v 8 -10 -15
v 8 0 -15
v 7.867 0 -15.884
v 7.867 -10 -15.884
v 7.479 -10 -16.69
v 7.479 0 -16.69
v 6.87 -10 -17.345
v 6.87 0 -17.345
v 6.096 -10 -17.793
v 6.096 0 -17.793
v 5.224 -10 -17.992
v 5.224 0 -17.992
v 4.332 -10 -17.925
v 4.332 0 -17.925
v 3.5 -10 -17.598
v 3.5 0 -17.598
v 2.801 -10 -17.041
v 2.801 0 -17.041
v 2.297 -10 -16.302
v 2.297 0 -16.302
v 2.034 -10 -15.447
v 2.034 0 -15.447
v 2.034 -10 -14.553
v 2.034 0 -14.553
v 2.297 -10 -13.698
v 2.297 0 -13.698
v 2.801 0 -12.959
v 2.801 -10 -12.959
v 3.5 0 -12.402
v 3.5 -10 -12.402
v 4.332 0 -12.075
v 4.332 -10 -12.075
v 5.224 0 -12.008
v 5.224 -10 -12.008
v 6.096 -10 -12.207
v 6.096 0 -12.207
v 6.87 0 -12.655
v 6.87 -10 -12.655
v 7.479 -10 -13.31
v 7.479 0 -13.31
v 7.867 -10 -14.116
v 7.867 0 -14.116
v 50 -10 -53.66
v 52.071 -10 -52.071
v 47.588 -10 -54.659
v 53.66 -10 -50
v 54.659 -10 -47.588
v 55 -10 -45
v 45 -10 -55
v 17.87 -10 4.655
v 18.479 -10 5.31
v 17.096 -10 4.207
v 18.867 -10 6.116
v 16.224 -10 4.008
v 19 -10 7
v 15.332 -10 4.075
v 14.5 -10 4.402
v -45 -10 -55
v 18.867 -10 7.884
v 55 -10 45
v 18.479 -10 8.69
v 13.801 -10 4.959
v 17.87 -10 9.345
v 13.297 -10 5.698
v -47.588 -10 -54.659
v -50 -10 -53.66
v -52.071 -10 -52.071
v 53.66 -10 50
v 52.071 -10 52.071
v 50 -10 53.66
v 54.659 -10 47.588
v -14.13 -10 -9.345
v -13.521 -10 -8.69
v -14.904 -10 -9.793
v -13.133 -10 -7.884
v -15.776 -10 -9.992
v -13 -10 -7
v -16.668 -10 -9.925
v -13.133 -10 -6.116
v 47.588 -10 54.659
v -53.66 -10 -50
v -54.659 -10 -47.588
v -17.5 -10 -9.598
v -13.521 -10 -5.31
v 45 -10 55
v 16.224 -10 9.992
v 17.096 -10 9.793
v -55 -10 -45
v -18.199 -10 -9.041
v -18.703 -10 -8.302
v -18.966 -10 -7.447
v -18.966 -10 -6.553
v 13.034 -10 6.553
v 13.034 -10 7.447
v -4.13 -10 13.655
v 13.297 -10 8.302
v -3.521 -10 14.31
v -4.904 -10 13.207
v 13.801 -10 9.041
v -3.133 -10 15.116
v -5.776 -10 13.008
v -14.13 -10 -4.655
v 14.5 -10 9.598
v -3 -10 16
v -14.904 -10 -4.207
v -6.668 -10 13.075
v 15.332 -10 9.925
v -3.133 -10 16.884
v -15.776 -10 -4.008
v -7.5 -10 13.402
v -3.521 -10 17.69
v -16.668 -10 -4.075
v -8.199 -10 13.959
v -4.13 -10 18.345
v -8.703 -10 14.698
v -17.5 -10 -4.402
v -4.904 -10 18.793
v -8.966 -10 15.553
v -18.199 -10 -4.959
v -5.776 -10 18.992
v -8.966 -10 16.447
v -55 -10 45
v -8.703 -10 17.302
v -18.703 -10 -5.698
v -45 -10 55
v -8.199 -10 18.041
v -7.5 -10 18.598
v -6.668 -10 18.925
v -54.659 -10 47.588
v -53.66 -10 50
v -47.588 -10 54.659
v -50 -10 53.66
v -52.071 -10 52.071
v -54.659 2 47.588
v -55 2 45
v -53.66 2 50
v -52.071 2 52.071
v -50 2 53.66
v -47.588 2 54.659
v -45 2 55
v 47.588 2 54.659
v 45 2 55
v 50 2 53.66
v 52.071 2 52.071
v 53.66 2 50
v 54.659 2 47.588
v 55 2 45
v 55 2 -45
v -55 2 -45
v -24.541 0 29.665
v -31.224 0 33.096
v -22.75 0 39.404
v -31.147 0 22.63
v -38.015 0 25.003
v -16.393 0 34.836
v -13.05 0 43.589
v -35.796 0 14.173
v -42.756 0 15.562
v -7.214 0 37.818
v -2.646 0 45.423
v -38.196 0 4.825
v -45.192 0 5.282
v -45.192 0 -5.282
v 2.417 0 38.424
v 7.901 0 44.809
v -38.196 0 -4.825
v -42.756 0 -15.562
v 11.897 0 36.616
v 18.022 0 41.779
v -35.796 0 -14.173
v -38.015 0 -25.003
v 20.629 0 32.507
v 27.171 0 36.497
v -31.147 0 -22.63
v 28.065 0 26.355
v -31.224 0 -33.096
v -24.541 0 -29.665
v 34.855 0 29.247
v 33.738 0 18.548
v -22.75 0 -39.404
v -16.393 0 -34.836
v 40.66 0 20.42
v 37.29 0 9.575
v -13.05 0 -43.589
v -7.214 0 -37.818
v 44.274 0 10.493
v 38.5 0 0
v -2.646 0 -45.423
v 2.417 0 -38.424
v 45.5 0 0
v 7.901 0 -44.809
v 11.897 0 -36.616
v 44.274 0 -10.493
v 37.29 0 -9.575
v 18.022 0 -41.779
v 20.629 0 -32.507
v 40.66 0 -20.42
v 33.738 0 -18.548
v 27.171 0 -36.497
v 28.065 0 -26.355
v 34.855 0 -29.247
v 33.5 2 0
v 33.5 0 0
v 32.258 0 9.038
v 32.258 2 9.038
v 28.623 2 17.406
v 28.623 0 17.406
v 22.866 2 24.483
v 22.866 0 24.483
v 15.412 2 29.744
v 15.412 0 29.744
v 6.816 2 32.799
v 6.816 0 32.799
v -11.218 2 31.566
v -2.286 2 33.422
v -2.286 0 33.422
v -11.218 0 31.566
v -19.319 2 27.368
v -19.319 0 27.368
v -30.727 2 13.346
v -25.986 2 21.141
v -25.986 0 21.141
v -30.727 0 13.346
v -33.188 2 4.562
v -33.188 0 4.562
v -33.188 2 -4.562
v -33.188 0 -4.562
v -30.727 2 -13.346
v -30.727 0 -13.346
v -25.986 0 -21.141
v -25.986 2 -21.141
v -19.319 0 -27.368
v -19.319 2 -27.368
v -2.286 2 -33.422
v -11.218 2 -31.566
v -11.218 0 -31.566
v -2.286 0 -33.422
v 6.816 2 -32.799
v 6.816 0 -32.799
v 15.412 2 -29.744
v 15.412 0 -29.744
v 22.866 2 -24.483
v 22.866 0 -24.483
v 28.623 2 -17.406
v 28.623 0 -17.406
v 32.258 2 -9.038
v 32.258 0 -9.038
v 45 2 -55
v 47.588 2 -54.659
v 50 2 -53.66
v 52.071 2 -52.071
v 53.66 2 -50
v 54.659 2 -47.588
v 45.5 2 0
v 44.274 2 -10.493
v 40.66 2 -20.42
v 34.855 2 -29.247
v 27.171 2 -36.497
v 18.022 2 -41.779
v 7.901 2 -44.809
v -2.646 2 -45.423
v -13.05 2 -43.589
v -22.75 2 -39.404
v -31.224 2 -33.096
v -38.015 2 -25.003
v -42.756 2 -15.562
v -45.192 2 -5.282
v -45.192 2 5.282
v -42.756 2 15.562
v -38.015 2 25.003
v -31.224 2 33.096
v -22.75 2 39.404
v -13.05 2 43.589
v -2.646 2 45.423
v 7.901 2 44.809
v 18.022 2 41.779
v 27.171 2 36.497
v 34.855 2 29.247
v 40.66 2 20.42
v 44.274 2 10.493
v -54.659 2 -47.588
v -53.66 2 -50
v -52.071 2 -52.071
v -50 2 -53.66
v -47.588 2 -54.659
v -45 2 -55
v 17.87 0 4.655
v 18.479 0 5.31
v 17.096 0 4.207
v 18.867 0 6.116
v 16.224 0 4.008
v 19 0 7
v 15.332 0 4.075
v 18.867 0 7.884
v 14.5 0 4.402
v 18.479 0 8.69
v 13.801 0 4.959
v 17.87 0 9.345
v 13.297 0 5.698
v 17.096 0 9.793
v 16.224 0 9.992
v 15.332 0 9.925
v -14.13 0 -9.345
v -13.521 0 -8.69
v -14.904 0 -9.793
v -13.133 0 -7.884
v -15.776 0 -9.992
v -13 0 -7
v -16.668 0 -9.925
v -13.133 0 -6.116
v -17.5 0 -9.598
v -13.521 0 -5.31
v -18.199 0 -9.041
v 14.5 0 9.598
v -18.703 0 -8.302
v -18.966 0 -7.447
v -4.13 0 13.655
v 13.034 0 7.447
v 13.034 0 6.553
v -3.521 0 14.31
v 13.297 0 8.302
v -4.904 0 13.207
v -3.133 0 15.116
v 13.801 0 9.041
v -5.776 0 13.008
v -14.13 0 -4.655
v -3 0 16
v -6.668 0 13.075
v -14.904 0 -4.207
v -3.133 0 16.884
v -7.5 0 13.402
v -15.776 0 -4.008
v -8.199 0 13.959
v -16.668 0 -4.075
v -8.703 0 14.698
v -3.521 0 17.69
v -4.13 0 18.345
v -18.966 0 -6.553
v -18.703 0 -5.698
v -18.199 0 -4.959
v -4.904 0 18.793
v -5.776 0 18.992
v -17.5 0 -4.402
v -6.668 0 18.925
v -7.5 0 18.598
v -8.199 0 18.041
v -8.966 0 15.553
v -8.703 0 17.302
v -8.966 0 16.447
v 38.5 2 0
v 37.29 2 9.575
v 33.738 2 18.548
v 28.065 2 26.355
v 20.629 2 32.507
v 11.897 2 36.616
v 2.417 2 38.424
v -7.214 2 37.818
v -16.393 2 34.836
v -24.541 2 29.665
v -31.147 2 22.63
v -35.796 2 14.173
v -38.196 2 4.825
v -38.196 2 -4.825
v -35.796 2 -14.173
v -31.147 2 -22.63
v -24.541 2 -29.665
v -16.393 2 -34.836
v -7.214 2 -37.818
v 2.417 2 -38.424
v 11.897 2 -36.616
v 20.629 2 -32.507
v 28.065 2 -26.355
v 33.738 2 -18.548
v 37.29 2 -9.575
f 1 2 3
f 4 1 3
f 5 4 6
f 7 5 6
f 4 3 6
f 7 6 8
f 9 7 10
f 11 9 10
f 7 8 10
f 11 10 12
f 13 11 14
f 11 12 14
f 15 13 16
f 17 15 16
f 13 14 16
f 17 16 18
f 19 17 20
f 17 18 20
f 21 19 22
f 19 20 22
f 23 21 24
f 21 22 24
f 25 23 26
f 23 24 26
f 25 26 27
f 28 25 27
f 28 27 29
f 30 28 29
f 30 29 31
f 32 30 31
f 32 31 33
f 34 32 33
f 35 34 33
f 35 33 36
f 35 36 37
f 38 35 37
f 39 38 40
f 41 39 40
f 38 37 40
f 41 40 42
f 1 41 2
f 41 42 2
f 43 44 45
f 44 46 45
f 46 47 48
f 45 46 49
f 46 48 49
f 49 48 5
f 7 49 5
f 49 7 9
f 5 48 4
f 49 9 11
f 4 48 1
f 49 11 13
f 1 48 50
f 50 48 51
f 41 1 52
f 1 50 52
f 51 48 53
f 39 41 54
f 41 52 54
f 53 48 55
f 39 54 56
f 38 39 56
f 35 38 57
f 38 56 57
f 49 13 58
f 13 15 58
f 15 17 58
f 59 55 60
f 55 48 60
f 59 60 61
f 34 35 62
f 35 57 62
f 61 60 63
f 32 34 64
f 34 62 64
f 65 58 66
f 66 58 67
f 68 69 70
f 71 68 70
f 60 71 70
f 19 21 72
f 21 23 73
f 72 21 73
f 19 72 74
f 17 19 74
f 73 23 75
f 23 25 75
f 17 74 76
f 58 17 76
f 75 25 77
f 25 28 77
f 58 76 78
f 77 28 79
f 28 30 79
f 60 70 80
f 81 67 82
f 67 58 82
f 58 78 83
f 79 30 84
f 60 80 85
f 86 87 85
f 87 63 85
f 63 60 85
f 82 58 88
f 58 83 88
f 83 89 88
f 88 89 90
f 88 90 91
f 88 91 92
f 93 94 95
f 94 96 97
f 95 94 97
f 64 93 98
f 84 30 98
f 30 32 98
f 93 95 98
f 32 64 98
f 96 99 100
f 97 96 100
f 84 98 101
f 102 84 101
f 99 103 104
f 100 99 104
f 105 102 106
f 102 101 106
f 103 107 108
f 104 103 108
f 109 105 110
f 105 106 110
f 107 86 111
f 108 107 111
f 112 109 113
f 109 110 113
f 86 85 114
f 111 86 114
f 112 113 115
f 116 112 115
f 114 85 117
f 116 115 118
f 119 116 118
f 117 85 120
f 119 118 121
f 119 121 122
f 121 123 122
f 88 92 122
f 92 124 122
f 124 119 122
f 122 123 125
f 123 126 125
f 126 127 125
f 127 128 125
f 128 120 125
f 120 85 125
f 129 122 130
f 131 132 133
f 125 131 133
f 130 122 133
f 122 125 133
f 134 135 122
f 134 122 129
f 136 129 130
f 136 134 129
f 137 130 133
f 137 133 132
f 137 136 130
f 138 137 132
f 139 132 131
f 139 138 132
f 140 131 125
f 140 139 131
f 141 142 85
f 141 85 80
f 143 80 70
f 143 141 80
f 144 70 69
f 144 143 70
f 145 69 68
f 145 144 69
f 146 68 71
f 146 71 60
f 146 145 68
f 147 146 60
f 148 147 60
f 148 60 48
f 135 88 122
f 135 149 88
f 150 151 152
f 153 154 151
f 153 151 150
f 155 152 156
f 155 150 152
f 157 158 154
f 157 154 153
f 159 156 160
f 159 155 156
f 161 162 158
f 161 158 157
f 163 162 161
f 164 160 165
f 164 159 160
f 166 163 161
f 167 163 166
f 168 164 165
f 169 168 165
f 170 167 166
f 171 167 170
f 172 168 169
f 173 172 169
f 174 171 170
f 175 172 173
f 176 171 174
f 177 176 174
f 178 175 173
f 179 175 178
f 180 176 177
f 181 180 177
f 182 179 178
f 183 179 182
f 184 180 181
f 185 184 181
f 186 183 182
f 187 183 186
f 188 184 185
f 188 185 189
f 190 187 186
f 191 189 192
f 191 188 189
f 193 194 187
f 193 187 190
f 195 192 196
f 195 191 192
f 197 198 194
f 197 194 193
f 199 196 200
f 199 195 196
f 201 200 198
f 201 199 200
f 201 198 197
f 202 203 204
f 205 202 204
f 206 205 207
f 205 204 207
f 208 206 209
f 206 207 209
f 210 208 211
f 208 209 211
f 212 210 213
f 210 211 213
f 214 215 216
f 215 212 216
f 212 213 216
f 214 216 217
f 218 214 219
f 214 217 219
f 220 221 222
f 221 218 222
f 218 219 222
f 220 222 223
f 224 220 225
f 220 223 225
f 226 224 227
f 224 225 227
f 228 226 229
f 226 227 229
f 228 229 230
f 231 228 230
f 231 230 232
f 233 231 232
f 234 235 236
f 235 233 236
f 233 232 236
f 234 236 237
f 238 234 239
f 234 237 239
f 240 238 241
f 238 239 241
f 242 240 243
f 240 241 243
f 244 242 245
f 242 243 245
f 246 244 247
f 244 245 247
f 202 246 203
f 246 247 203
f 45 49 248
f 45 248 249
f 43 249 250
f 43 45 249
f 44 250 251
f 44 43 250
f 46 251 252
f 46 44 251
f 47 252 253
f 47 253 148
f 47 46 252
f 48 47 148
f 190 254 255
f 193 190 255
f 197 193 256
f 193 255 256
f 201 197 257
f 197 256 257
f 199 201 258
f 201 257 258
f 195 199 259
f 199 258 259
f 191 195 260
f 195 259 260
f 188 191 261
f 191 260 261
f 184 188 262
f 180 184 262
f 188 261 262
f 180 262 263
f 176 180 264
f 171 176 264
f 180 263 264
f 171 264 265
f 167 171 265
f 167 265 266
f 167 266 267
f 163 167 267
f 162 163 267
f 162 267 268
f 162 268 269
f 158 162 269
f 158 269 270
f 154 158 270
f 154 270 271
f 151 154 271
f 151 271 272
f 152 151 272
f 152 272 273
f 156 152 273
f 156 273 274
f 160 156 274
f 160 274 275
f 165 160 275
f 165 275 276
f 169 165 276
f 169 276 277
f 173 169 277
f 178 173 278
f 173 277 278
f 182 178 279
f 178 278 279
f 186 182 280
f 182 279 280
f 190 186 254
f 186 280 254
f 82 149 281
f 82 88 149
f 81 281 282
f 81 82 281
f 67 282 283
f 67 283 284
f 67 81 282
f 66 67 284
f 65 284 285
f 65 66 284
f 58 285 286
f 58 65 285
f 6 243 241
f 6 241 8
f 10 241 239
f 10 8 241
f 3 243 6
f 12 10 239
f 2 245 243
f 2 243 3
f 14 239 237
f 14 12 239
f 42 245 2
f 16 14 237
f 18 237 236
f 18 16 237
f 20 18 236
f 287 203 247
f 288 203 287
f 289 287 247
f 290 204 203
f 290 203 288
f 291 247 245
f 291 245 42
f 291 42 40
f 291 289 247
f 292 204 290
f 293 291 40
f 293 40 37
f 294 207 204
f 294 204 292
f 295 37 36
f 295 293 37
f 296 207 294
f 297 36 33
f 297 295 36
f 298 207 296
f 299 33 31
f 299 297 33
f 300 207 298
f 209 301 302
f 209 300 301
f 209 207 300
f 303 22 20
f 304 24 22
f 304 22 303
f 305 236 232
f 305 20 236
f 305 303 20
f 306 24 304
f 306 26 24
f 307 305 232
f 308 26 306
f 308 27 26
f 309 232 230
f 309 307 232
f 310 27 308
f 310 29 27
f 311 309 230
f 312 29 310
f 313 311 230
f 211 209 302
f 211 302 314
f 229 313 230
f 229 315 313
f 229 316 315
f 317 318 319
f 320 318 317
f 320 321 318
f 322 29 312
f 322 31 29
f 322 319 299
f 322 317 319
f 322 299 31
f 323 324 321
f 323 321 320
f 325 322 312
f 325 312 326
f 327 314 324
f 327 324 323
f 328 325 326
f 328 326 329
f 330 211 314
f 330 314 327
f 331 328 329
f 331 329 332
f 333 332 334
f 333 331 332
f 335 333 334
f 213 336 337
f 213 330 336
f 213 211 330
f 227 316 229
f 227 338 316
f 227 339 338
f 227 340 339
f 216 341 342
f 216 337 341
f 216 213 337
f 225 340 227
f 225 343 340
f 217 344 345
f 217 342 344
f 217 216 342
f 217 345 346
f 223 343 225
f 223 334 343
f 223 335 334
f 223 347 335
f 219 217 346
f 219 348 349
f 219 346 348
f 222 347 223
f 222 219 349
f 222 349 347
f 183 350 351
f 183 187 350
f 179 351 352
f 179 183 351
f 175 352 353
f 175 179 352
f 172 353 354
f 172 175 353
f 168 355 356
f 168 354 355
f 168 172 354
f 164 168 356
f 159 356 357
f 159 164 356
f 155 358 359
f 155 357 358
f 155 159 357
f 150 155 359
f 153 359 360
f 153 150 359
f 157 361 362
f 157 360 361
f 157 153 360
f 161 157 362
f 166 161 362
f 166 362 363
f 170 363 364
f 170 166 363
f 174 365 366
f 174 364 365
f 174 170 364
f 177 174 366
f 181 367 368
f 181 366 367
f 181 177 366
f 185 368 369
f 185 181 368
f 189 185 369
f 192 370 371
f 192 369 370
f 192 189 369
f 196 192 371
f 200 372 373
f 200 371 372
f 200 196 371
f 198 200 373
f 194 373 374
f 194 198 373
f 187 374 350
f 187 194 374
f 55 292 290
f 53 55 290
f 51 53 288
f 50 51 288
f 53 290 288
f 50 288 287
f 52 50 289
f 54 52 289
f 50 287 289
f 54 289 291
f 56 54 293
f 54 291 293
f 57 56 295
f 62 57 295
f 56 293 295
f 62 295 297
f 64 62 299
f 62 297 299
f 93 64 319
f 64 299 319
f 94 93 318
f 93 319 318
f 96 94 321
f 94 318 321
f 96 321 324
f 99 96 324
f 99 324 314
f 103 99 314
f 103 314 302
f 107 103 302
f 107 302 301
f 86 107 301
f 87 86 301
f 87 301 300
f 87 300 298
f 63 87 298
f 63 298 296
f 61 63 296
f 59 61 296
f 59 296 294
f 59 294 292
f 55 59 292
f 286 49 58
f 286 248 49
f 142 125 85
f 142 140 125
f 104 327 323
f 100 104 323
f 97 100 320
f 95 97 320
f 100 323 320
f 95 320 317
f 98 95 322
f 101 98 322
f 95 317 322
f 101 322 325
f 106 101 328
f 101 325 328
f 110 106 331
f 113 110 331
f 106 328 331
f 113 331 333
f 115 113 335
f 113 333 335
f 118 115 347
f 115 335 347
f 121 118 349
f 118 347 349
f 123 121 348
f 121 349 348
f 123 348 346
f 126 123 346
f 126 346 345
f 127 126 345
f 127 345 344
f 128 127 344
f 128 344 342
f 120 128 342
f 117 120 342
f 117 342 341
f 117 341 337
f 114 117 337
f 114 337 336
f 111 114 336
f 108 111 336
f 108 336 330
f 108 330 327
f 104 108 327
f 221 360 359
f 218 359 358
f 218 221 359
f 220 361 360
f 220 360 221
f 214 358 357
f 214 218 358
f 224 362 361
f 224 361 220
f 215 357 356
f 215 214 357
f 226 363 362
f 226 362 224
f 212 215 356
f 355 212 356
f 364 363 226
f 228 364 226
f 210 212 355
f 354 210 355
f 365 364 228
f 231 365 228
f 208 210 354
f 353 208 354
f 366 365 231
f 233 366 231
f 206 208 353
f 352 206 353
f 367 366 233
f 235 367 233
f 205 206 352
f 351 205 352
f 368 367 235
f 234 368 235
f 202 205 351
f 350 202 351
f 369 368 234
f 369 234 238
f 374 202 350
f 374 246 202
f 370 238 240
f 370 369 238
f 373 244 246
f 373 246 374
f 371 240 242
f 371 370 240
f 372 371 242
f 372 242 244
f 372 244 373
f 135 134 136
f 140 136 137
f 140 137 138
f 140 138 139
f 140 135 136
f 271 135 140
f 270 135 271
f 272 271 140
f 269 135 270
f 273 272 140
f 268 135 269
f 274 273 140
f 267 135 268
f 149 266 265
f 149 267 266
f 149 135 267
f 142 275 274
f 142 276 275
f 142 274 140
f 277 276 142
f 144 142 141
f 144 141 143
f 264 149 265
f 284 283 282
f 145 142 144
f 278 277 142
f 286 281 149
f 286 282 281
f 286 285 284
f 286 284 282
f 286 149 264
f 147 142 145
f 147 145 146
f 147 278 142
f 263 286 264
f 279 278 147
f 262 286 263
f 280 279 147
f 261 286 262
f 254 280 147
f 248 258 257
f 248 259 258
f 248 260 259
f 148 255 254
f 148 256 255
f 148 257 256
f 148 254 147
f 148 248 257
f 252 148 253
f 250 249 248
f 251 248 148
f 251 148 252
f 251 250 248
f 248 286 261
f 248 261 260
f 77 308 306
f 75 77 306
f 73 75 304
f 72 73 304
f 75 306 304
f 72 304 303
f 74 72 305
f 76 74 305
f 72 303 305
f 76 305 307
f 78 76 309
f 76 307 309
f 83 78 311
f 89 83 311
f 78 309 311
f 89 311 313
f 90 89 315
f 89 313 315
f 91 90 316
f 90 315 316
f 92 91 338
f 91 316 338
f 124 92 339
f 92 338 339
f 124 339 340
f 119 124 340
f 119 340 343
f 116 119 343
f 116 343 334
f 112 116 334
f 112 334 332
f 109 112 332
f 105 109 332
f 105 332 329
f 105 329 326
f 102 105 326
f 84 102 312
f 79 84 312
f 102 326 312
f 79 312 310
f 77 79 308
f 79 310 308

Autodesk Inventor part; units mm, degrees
ref_plane "YZ Plane" through (0, 0, 0) normal (1, 0, 0) x (0, 1, 0)
ref_plane "XZ Plane" through (0, 0, 0) normal (0, 1, 0) x (-1, 0, 0)
ref_plane "XY Plane" through (0, 0, 0) normal (0, 0, 1) x (1, 0, 0)
sketch "스케치1" plane through (0, 0, 0) normal (0, 1, 0) x (-1, 0, 0)
  line L0 (55, 55) -> (-55, 55)
  line L1 (-55, 55) -> (-55, -55)
  line L2 (-55, -55) -> (55, -55)
  line L3 (55, -55) -> (55, 55)
  point P0 (0, 0)
  dimension "d0" = 110
  dimension "d1" = 110
  dimension "d2" = 55
  dimension "d3" = 55
extrude "돌출1" add sketch "스케치1" against normal blind 10
sketch "스케치2" plane through (0, 0, 0) normal (0, 1, 0) x (1, 0, 0)
  circle A0 centre (0, 0) radius 33.5 projected
  circle A1 centre (0, 0) radius 38.5 projected
  circle A2 centre (0, 0) radius 43.5 projected
  line L0 (-55, -55) -> (55, -55) projected
  line L1 (55, -55) -> (55, 55) projected
  line L2 (55, 55) -> (-55, 55) projected
  line L3 (-55, 55) -> (-55, -55) projected
extrude "돌출2" add sketch "스케치2" along normal blind 2
sketch "스케치3" plane through (0, 0, 0) normal (0, 1, 0) x (1, 0, 0)
  circle A0 centre (0, 0) radius 33.5 projected
  circle A1 centre (-16, 7) radius 3
  circle A2 centre (5, 15) radius 3
  circle A3 centre (16, -7) radius 3
  circle A4 centre (-6, -16) radius 3
  dimension "d8" = 6
  dimension "d9" = 6
  dimension "d10" = 6
  dimension "d11" = 6
extrude "돌출3" cut sketch "스케치3" against normal blind 10 contours A1 | A2 | A3 | A4
fillet "모깎기1" radius 10 4 edges at (-55, -4, -55) (55, -4, -55) (55, -4, 55) (-55, -4, 55)
sketch "스케치5" plane through (0, 2, 0) normal (0, 1, 0) x (1, 0, 0)
  circle A0 centre (0, 0) radius 43.5 projected
  arc A1 (-55, -45) -> (-45, -55) centre (-45, -45) ccw projected
  line L0 (-45, -55) -> (45, -55) projected
  arc A2 (45, -55) -> (55, -45) centre (45, -45) ccw projected
  line L1 (55, -45) -> (55, 45) projected
  arc A3 (55, 45) -> (45, 55) centre (45, 45) ccw projected
  line L2 (45, 55) -> (-45, 55) projected
  arc A4 (-45, 55) -> (-55, 45) centre (-45, 45) ccw projected
  line L3 (-55, 45) -> (-55, -45) projected
  circle A5 centre (0, 0) radius 38.5 projected
  circle A6 centre (0, 0) radius 43.5 projected
  circle A7 centre (0, 0) radius 45.5
  dimension "d18" = 91
extrude "돌출5" cut sketch "스케치5" against normal blind 2 contours A7
properties part number "실리콘틀_밑판" material "나일론, 이황화 몰리브덴"
